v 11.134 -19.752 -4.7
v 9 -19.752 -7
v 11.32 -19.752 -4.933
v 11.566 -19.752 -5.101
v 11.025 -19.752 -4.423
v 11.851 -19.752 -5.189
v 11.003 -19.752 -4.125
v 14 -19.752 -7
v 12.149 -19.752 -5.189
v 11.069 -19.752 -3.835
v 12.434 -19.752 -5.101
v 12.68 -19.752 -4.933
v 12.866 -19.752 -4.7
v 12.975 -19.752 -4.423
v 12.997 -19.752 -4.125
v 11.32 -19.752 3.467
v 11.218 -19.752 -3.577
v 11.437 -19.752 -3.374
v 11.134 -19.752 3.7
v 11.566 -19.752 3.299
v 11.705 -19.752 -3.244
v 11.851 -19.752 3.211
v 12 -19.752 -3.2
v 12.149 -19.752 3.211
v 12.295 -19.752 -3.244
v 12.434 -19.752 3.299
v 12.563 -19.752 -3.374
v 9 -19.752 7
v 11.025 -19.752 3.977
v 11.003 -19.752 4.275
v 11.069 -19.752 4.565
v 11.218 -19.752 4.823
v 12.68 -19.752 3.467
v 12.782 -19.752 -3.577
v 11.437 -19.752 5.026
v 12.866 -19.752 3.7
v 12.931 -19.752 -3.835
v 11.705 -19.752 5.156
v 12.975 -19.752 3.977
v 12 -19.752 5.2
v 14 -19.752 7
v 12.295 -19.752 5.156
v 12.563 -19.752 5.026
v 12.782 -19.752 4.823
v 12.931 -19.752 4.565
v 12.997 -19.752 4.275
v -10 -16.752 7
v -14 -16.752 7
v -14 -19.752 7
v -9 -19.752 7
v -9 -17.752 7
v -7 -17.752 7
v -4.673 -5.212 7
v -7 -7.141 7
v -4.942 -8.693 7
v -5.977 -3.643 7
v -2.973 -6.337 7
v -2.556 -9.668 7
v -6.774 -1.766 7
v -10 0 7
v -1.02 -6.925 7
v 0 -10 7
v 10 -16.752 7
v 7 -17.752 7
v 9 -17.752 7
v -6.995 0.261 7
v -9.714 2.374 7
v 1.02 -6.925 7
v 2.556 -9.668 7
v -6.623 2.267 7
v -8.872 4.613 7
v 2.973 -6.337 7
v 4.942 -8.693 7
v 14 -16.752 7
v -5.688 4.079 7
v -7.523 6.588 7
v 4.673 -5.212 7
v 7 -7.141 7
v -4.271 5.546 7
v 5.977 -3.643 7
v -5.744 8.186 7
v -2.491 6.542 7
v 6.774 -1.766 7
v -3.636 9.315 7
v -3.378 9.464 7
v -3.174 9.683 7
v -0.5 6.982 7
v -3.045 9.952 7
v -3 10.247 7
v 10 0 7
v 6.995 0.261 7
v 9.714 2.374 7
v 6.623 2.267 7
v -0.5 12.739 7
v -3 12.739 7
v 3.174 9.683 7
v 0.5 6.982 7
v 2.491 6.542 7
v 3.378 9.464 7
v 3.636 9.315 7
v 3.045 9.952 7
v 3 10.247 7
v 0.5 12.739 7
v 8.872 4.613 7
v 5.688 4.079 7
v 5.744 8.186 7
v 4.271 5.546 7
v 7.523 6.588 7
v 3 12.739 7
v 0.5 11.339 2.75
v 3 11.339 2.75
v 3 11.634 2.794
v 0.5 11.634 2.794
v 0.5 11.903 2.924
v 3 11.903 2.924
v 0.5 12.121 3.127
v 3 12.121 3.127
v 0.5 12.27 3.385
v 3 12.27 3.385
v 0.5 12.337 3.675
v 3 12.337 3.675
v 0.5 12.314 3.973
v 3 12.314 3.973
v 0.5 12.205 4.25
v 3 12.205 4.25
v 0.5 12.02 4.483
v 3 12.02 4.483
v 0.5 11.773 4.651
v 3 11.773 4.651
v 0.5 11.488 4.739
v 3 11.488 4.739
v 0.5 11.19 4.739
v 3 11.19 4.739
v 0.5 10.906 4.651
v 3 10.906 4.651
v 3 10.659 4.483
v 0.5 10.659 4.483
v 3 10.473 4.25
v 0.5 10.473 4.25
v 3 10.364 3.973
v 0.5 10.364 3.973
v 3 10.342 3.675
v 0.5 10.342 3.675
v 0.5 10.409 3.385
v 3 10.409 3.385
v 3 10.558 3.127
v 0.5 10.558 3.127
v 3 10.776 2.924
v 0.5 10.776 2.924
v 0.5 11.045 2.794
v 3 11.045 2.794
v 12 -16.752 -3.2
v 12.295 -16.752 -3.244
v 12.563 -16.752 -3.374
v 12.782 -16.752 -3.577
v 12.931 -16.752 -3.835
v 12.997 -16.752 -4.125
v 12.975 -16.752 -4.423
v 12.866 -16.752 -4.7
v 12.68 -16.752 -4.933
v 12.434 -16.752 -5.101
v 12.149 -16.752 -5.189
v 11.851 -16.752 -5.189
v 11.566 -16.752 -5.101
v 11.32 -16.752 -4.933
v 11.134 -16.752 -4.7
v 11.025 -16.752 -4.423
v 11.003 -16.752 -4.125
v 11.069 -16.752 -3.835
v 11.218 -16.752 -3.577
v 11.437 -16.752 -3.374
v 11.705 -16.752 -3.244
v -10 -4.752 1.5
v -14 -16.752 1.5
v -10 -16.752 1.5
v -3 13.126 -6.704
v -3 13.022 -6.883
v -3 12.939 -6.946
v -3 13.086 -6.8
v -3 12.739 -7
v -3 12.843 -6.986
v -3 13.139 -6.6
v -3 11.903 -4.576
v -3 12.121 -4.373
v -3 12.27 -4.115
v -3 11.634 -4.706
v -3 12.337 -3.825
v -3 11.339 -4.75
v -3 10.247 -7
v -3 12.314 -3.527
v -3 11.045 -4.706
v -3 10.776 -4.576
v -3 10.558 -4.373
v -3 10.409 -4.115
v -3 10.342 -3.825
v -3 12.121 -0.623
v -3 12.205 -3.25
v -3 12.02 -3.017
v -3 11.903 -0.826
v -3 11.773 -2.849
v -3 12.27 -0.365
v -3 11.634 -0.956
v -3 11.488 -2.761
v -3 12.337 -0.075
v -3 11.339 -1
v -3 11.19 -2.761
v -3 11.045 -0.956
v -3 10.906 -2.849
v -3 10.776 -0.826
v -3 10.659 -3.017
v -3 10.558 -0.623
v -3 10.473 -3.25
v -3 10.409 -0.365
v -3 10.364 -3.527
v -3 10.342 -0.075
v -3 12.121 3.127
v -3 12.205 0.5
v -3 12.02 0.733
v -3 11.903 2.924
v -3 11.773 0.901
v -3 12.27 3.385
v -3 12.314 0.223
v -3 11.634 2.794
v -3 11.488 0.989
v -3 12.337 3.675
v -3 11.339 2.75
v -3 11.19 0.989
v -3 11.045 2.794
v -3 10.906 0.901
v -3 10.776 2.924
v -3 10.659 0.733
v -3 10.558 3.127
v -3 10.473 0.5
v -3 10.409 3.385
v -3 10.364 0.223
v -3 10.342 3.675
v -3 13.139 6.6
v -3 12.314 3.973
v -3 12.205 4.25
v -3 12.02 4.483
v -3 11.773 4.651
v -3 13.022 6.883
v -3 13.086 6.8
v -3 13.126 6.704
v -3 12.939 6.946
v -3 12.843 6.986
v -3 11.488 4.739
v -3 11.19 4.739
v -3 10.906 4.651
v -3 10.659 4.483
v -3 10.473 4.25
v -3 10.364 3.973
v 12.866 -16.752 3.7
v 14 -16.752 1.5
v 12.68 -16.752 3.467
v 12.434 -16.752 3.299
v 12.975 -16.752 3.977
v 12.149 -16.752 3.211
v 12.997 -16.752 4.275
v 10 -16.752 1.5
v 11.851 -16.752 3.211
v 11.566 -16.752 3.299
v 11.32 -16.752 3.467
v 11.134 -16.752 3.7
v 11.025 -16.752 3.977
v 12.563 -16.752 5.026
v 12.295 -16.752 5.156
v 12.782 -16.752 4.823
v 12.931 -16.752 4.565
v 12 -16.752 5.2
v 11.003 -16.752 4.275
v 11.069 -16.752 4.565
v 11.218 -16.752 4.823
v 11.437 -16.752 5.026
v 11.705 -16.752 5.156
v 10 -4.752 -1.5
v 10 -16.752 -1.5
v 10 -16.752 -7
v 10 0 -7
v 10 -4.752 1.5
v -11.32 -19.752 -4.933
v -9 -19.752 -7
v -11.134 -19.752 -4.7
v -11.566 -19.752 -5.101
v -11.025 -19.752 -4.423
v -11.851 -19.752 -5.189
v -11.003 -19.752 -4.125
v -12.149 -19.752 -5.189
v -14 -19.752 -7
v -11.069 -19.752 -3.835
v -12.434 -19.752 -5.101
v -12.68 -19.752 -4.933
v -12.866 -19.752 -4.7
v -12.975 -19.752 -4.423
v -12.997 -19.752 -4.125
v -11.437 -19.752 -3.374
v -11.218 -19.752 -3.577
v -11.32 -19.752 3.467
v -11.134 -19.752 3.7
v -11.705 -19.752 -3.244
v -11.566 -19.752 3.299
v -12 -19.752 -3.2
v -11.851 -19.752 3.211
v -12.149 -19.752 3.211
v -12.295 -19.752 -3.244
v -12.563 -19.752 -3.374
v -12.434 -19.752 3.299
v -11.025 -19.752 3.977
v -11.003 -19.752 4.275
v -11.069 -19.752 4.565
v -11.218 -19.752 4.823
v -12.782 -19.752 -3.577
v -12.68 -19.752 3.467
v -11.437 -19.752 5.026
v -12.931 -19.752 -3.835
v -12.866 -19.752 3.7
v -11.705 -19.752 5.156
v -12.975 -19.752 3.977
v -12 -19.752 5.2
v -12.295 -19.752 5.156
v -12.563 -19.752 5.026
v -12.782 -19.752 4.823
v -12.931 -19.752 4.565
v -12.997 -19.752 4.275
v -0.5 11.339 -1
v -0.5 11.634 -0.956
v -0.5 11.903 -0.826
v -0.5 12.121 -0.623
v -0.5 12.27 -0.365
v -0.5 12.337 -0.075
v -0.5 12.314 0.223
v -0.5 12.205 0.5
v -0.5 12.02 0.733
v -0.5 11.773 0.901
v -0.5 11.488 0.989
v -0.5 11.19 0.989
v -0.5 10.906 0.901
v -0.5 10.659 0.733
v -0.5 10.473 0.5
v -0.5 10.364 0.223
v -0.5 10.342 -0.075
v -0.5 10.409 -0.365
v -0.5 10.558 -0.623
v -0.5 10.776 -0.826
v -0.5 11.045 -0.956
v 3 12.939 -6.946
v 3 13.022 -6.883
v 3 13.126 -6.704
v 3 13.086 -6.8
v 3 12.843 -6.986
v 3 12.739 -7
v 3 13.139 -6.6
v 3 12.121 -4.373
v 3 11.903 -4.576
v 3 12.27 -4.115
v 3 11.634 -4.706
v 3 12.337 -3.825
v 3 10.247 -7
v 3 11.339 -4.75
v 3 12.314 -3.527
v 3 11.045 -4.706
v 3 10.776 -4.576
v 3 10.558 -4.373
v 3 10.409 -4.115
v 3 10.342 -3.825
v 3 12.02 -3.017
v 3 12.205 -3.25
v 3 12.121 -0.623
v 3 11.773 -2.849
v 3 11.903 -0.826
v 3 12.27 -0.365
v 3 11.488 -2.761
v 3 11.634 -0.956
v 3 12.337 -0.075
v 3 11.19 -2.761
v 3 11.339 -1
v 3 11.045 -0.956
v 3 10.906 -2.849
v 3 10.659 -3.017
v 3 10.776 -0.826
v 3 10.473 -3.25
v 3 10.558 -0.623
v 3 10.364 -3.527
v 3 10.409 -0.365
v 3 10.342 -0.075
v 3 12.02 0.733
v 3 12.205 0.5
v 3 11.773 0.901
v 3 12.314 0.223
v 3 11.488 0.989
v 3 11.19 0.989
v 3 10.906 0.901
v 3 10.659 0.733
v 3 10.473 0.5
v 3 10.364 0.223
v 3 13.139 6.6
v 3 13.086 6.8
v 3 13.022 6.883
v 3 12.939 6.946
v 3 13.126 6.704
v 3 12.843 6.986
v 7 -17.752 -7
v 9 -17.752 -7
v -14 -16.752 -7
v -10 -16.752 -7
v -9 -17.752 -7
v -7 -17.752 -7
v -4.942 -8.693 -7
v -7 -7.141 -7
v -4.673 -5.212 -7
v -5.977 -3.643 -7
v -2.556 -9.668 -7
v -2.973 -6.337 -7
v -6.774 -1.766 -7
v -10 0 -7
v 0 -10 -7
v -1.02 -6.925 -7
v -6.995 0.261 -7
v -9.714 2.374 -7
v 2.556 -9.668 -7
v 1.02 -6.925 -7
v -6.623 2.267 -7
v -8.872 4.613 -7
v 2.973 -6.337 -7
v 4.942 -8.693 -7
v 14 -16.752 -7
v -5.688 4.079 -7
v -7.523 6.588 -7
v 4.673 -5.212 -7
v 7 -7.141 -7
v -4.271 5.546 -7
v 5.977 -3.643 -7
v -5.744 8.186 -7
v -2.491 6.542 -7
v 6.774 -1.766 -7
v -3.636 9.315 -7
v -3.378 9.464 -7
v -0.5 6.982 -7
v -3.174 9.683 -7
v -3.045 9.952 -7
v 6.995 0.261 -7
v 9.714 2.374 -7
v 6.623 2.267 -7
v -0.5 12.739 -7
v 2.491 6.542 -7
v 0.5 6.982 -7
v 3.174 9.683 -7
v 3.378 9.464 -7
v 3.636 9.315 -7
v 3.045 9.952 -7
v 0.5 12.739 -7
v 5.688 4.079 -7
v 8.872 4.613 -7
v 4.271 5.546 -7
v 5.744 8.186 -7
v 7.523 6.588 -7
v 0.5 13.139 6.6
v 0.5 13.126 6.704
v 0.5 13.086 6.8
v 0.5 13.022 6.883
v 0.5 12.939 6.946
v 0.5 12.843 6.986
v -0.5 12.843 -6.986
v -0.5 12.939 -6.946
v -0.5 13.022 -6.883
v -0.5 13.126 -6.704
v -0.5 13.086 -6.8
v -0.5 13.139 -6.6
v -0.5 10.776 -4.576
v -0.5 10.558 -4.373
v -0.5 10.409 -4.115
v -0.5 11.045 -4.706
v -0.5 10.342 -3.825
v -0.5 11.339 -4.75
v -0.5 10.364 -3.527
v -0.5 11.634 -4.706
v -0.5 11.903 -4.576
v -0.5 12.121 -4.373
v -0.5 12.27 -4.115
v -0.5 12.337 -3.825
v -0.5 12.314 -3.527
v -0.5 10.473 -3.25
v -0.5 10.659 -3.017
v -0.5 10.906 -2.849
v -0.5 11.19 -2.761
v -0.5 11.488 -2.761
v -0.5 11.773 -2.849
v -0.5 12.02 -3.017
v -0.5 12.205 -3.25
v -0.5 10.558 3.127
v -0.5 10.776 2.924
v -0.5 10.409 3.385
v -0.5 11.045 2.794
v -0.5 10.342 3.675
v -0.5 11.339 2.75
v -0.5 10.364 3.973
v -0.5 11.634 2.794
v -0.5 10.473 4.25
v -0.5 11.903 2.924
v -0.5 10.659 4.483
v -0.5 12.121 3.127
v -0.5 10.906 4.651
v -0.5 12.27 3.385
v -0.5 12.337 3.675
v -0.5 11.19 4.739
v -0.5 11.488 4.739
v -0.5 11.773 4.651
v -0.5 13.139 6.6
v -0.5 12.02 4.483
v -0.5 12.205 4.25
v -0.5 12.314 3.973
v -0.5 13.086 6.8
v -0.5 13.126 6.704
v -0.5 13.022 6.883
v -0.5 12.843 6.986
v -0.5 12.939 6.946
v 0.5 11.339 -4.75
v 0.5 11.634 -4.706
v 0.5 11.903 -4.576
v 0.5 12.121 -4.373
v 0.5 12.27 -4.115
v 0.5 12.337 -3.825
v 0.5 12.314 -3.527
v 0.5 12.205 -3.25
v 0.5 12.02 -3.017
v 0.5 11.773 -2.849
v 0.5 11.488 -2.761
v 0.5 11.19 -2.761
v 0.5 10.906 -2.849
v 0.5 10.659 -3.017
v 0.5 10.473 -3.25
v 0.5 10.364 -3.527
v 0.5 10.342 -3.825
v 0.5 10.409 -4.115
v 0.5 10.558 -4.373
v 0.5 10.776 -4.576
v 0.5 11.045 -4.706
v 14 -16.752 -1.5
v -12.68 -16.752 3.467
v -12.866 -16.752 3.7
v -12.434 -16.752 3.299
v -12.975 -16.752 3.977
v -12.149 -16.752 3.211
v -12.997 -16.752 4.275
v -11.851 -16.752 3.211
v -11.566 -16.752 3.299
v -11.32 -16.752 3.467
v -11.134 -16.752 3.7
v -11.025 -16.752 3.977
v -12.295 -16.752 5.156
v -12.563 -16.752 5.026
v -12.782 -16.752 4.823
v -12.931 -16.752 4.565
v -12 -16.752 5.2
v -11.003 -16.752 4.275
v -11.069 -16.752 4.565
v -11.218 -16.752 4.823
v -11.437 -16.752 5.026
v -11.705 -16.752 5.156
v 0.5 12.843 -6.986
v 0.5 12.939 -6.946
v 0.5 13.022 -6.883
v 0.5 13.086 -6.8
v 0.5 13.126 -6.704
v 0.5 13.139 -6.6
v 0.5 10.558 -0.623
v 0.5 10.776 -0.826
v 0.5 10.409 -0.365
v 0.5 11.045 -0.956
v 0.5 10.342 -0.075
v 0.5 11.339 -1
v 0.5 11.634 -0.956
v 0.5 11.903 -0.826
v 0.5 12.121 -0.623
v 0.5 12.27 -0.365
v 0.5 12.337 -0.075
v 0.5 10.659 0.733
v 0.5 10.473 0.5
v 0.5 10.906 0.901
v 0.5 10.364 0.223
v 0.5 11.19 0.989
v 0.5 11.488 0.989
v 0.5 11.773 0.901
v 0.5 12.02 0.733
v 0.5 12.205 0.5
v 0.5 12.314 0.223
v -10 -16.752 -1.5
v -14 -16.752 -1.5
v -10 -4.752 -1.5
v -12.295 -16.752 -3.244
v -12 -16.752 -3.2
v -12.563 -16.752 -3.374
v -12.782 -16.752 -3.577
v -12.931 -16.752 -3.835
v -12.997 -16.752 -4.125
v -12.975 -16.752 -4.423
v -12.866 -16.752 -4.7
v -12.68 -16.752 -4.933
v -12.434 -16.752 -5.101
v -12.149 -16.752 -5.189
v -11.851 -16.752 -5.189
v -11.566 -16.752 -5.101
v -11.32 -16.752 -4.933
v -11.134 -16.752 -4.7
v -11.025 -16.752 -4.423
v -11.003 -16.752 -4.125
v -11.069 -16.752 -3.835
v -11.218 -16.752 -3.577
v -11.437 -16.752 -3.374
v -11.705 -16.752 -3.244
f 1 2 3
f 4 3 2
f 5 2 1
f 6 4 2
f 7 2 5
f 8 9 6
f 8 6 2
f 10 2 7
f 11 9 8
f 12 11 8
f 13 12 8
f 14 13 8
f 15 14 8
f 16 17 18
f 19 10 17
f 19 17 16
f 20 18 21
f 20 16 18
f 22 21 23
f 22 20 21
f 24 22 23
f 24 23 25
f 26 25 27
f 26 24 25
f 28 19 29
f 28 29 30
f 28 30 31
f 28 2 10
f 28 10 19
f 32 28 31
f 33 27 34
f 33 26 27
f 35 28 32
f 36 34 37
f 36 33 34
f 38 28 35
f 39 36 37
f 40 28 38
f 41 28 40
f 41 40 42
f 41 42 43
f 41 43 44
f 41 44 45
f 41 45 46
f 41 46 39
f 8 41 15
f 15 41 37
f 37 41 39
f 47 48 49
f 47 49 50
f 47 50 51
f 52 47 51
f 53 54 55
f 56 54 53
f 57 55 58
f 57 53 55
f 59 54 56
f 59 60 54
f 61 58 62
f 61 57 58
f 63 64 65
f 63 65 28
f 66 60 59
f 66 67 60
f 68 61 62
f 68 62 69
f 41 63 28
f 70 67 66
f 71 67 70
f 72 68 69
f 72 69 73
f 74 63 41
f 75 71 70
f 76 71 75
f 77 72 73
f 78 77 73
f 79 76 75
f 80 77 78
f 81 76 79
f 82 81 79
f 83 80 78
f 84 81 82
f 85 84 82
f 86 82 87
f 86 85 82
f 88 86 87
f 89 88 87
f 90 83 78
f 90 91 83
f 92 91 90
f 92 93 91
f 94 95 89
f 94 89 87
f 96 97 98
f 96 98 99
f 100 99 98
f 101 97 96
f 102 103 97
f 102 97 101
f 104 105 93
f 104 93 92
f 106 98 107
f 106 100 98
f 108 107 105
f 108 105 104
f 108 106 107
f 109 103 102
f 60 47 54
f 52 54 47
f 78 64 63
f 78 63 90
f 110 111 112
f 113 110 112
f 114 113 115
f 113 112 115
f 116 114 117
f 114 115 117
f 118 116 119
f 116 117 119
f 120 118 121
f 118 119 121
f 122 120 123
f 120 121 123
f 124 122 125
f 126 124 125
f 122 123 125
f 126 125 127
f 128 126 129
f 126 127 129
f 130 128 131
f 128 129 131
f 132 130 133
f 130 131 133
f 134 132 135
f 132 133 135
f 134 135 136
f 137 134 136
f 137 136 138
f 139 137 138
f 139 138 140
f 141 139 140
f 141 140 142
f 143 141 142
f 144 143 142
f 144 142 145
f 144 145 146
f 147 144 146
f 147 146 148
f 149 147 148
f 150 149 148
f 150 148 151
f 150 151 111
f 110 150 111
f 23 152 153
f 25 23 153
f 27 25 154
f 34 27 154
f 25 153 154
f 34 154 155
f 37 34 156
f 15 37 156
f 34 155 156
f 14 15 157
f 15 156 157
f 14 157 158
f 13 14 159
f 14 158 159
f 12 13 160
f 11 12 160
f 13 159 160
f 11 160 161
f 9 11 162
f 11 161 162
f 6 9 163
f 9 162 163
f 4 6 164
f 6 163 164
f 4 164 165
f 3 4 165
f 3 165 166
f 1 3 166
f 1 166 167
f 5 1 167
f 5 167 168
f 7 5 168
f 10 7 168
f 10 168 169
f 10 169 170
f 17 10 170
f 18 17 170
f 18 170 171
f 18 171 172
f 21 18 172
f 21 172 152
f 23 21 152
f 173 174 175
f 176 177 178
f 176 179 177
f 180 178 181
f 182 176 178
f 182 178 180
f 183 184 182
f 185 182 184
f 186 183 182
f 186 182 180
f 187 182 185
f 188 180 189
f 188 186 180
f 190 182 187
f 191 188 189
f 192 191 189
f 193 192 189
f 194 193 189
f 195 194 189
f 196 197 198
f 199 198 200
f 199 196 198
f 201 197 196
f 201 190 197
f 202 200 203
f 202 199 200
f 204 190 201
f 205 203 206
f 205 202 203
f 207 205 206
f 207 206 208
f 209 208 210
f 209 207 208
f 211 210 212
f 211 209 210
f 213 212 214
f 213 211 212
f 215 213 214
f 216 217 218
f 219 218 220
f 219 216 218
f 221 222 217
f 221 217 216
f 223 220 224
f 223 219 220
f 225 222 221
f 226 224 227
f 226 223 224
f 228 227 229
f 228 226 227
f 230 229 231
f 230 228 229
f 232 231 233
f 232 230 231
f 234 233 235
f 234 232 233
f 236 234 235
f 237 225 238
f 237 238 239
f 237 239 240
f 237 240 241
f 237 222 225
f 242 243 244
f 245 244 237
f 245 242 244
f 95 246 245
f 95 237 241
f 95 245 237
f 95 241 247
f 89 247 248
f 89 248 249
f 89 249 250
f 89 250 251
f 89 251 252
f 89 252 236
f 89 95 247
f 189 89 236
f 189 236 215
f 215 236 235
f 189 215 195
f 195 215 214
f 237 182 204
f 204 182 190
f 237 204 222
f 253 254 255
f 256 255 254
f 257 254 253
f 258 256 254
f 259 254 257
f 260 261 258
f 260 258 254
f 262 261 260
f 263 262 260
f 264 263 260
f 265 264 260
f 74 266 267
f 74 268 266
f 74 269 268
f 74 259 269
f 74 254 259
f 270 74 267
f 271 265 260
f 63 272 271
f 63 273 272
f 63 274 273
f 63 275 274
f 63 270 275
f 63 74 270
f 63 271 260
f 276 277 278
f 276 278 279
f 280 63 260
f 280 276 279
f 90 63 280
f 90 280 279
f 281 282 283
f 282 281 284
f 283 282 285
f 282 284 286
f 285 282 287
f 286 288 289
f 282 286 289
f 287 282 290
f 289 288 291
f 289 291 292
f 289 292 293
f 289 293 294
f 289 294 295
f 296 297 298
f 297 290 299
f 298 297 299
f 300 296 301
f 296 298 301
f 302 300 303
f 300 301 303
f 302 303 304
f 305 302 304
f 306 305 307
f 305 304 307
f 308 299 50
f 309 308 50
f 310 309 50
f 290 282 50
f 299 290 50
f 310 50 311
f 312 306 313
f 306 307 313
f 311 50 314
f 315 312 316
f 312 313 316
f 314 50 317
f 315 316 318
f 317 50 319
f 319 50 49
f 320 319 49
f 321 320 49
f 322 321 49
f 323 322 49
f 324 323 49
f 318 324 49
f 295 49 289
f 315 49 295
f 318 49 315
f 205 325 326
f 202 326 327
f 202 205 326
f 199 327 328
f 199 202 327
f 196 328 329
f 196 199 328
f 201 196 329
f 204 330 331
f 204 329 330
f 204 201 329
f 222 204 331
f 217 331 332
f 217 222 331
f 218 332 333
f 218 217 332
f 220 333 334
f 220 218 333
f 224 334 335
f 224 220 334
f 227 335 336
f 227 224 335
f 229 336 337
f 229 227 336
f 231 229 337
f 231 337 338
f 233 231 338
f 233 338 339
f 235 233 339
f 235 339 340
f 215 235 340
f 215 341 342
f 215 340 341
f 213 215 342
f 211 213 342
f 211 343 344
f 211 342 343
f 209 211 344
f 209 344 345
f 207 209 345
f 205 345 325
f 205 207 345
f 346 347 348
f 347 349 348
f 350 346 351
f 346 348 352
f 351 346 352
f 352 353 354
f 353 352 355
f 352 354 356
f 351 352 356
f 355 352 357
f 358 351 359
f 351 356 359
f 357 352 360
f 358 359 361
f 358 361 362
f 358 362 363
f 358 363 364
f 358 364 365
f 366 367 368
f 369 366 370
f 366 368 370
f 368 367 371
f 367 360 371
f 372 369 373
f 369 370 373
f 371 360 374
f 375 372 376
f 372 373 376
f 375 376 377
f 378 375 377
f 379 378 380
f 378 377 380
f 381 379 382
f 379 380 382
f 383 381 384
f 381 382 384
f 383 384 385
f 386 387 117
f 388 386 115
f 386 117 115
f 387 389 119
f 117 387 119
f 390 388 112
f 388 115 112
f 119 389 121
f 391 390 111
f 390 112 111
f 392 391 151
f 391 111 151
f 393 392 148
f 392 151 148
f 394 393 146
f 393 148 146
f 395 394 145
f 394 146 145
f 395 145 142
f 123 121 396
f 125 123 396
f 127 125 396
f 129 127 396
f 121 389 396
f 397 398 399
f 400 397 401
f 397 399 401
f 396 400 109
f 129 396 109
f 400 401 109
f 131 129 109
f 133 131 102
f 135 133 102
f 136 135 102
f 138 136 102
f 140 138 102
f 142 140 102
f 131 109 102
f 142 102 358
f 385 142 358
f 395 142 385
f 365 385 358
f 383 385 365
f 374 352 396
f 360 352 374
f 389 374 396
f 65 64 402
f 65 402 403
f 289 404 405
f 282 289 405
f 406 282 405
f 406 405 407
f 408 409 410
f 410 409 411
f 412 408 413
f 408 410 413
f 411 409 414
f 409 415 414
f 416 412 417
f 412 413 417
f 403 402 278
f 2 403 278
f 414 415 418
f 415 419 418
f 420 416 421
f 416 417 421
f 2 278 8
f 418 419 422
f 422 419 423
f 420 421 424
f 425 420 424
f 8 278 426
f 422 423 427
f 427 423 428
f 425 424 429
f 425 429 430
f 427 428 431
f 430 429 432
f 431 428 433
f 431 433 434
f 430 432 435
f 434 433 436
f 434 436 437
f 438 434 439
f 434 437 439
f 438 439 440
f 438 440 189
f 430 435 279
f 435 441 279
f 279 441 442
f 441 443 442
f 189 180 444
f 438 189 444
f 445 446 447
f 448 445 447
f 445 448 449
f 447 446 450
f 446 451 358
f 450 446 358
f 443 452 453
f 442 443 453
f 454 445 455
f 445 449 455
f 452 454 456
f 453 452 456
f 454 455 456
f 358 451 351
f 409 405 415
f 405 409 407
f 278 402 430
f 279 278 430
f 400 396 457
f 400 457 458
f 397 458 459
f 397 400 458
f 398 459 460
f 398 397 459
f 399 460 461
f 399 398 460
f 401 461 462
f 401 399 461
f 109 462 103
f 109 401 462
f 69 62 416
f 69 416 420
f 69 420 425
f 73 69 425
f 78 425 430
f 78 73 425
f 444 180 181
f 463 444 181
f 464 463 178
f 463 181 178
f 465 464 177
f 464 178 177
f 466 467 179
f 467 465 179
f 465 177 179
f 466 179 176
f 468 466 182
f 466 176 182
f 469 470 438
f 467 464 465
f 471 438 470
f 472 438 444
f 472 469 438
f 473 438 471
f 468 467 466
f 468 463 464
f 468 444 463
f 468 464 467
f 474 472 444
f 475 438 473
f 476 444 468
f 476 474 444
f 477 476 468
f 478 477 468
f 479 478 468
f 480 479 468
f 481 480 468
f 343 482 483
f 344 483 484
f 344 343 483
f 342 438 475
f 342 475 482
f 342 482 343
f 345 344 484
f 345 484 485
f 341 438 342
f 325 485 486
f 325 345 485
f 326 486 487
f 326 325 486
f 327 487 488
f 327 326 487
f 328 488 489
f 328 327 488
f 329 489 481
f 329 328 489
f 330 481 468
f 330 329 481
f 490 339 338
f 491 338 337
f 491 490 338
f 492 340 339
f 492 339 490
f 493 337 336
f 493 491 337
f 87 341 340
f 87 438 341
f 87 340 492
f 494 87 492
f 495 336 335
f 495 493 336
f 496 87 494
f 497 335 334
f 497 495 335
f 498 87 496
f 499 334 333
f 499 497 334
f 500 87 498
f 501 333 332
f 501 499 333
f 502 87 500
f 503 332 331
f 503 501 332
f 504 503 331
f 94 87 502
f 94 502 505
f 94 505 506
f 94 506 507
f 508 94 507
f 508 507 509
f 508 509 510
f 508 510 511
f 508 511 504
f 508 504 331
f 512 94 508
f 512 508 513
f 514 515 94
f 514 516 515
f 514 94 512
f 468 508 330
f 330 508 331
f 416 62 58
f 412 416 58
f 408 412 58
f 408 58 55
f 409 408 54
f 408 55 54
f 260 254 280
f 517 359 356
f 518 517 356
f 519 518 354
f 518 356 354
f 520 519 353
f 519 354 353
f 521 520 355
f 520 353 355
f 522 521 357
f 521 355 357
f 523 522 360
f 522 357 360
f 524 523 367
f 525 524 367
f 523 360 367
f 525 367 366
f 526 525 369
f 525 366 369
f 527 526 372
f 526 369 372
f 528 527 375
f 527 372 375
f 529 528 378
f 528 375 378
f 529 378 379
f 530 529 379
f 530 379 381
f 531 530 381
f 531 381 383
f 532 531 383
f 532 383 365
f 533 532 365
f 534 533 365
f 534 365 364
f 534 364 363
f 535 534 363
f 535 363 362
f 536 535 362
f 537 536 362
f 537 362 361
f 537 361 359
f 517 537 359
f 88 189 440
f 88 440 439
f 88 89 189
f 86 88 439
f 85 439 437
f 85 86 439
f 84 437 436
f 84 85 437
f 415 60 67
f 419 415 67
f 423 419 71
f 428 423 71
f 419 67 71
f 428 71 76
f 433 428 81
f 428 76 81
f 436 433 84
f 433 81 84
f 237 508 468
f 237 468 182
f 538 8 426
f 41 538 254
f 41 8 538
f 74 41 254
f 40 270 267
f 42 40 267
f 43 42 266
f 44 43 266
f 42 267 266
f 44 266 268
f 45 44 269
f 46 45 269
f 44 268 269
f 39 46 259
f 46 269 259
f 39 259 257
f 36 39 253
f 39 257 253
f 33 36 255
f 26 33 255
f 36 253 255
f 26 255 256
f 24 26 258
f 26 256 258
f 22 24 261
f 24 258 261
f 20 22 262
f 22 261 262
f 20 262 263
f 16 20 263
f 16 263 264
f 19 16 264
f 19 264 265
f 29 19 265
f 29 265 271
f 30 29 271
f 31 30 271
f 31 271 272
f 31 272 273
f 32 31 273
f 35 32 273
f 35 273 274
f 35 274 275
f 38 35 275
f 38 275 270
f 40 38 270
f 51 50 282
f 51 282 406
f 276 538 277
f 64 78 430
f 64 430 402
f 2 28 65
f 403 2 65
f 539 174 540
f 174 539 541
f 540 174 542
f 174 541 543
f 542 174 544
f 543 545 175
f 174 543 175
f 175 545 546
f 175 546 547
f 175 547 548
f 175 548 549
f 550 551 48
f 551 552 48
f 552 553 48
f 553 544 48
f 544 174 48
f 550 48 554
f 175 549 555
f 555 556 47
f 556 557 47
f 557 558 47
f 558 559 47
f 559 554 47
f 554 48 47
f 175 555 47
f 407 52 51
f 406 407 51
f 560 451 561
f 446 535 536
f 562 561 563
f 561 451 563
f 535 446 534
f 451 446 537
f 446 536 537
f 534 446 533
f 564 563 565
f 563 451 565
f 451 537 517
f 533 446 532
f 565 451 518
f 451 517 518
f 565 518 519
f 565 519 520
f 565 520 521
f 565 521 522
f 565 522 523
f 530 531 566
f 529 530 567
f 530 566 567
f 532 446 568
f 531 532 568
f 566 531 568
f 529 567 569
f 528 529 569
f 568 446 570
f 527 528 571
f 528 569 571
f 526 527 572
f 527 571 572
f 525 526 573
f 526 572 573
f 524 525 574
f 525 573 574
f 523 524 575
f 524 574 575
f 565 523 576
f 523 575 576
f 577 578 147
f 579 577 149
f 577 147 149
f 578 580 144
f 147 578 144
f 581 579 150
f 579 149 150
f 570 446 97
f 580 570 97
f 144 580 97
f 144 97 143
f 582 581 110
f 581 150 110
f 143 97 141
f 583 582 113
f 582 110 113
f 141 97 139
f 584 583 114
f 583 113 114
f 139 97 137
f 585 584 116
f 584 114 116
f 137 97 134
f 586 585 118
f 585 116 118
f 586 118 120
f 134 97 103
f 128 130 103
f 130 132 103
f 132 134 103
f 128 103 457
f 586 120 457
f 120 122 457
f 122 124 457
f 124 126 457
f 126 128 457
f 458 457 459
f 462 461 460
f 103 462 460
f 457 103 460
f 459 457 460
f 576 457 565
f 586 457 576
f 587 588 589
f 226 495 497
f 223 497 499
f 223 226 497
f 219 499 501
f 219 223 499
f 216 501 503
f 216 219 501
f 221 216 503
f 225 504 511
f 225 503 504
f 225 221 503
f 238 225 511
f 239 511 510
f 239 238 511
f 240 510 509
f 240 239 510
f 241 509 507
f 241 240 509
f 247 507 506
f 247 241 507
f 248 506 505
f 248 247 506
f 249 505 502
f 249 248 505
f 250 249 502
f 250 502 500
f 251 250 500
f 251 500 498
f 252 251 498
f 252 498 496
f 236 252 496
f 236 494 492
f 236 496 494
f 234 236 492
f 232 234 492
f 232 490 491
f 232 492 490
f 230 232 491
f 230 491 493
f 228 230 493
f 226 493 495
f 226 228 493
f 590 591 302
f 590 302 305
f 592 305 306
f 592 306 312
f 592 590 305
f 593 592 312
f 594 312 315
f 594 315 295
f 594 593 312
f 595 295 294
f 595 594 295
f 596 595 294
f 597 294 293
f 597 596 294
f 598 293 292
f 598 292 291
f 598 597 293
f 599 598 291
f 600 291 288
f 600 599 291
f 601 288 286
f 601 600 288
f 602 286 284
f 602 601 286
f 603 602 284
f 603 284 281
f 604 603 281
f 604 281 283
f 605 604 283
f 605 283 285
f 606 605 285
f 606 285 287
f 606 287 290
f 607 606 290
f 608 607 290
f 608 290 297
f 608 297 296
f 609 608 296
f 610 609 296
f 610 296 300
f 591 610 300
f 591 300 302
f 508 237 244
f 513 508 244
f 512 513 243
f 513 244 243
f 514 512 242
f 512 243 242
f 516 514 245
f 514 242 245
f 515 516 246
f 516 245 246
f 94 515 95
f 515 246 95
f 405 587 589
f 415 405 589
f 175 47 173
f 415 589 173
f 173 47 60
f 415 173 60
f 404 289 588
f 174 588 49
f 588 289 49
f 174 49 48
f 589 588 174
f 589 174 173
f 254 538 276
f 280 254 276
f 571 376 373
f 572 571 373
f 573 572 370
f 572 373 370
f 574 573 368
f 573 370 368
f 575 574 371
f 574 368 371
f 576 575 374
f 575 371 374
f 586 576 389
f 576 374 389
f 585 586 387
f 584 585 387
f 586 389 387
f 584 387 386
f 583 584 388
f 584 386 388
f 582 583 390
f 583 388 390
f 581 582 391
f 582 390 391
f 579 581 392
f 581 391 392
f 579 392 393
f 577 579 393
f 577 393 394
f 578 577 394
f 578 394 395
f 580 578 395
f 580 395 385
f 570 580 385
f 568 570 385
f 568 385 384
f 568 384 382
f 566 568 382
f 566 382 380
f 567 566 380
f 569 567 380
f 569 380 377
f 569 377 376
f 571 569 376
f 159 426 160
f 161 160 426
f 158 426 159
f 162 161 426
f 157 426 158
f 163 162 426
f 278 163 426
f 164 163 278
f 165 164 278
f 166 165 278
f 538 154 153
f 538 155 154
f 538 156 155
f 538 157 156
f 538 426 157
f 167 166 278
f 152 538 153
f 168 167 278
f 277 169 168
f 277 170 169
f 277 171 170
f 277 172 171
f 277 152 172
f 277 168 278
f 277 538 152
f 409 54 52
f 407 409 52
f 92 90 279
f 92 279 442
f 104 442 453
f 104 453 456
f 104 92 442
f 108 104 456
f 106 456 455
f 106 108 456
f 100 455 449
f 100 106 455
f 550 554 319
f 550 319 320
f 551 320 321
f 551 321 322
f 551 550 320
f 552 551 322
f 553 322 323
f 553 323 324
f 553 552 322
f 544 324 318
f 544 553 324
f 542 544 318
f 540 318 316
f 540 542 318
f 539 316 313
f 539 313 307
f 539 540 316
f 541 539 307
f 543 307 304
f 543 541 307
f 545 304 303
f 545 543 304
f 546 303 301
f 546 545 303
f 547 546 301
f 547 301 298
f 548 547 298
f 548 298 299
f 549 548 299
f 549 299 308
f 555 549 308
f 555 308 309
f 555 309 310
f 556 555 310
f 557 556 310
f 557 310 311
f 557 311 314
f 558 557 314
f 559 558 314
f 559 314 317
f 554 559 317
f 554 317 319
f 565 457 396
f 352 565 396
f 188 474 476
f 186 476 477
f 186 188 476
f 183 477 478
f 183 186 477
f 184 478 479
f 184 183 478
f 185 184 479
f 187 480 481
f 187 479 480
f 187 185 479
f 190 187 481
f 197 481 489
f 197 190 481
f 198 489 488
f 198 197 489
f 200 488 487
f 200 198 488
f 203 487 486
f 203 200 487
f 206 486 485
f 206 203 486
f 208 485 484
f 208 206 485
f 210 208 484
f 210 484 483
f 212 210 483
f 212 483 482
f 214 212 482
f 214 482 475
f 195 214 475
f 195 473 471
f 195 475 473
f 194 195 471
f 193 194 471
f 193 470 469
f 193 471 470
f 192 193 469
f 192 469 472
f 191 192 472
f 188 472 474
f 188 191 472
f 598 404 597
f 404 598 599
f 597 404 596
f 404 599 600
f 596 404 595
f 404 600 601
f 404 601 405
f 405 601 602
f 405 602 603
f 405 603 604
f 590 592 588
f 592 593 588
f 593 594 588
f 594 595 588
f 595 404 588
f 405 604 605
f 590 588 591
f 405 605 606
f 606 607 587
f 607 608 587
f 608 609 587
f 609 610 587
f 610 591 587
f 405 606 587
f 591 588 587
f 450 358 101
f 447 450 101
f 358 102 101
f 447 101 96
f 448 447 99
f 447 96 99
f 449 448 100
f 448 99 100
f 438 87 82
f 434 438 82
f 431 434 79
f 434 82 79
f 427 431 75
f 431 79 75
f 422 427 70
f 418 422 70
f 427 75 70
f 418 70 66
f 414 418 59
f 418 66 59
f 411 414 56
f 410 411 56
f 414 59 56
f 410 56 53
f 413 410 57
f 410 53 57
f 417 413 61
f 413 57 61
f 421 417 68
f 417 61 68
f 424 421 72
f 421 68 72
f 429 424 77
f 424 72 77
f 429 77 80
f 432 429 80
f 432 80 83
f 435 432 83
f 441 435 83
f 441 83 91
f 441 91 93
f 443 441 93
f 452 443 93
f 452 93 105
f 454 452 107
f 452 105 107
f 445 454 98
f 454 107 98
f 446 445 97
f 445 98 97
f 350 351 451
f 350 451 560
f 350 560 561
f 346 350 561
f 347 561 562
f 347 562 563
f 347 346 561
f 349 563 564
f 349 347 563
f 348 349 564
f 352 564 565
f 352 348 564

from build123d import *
from build123d.topology import SkipClean

# Parameters (mm, degrees)
BOSS_EXTRUDE1_DEPTH = 7
SKETCH3_R           = 1
CUT_EXTRUDE1_DEPTH  = 10
RIB1_REACH          = 27.202
SKETCH2_WALL_W      = 65.053025346
SKETCH2_WALL_H      = 3
BOSS_EXTRUDE2_DEPTH = 7
SKETCH5_R           = 1
CUT_EXTRUDE2_DEPTH  = 14
FILLET1_R           = 1
FILLET2_R           = 0.4
SKETCH6_W           = 2
SKETCH6_H           = 4.221802259
CUT_EXTRUDE3_DEPTH  = 28.966741934
SKETCH7_W           = 1
SKETCH7_H           = 18.119739654
CUT_EXTRUDE4_DEPTH  = 28.966741934


with BuildPart() as part:
    # Sketch1 → Boss-Extrude1 (new, symmetric)
    with BuildSketch(Plane.XY):
        with BuildLine():
            Line((0, 10), (0, 7))
            ThreePointArc((0, 7), (7, 0), (0, -7))
            Line((0, -7), (0, -10))
            ThreePointArc((0, -10), (3.780589618, -9.257815193), (7, -7.141428429))
            Line((7, -7.141428429), (7, -19.751927866))
            Line((7, -19.751927866), (14, -19.751927866))
            Line((14, -19.751927866), (14, -16.751927866))
            Line((14, -16.751927866), (10, -16.751927866))
            Line((10, -16.751927866), (10, 0))
            ThreePointArc((10, 0), (7.071067812, 7.071067812), (0, 10))
        make_face()
    extrude(amount=BOSS_EXTRUDE1_DEPTH, both=True)

    # Sketch3 → Cut-Extrude1 (cut)
    with BuildSketch(Plane(origin=(0, -16.751927866, 0), x_dir=(1, 0, 0), z_dir=(0, 1, 0))):
        with Locations(Location((12, -4.2, 0), (0, 0, 270))):
            Circle(SKETCH3_R)
        with Locations(Location((12, 4.2, 0), (0, 0, 270))):
            Circle(SKETCH3_R)
    extrude(amount=-CUT_EXTRUDE1_DEPTH, mode=Mode.SUBTRACT)

    # Sketch2 wall → Rib1 (add, up to next)
    with BuildSketch(Plane(origin=(12, -10.751927866, 0), x_dir=(-0.316227766017, 0.948683298051, 0), z_dir=(-0.948683298051, -0.316227766017, 0)), mode=Mode.PRIVATE) as rib1_sk1:
        Rectangle(SKETCH2_WALL_W, SKETCH2_WALL_H)
    rib1_tool1 = extrude(rib1_sk1.sketch, amount=RIB1_REACH, mode=Mode.PRIVATE) - part.part
    add(rib1_tool1.solids().sort_by_distance((12, -10.751927866, 0))[0])

    # Sketch4 → Boss-Extrude2 (add, symmetric)
    with BuildSketch(Plane.XY):
        with BuildLine():
            Line((0, 10), (0, 13.139392014))
            Line((0, 13.139392014), (3, 13.139392014))
            Line((3, 13.139392014), (3, 9.539392014))
            ThreePointArc((3, 9.539392014), (1.517576993, 9.884177258), (0, 10))
        make_face()
    extrude(amount=BOSS_EXTRUDE2_DEPTH, both=True)

    # Sketch5 → Cut-Extrude2 (cut)
    with BuildSketch(Plane(origin=(3, 0, 0), x_dir=(0, 0, -1), z_dir=(1, 0, 0))):
        with Locations((-3.75, 11.339392014)):
            Circle(SKETCH5_R)
        with Locations((0, 11.339392014)):
            Circle(SKETCH5_R)
        with Locations((3.75, 11.339392014)):
            Circle(SKETCH5_R)
    extrude(amount=-CUT_EXTRUDE2_DEPTH, mode=Mode.SUBTRACT)

    # Fillet1
    fillet1_edges = [part.edges().sort_by_distance(p)[0] for p in [
        (3, 9.539392014, 0),
    ]]
    fillet(fillet1_edges, radius=FILLET1_R)

    # Fillet2
    fillet2_edges = [part.edges().sort_by_distance(p)[0] for p in [
        (1.5, 13.139392014, -7),
        (1.5, 13.139392014, 7),
    ]]
    fillet(fillet2_edges, radius=FILLET2_R)

    # Sketch6 → Cut-Extrude3 (cut, through all)
    with BuildSketch(Plane.XY.offset(7)):
        with Locations((8, -19.862828996)):
            Rectangle(SKETCH6_W, SKETCH6_H)
    extrude(amount=-CUT_EXTRUDE3_DEPTH, mode=Mode.SUBTRACT)

    # Mirror1: part across plane


with BuildPart() as part_1:
    with SkipClean():  # the faces are left unmerged after this step: merging them gives an invalid solid
        add(part.part)
        add(part.part.mirror(Plane(origin=(0, 0, 0), x_dir=(0, 0, 1), z_dir=(1, 0, 0))))

    # Sketch7 → Cut-Extrude4 (cut, through all)
    with BuildSketch(Plane.XY.offset(7)):
        with Locations((0, 9.869696007)):
            Rectangle(SKETCH7_W, SKETCH7_H)
    extrude(amount=-CUT_EXTRUDE4_DEPTH, mode=Mode.SUBTRACT)


solid = part_1.part
